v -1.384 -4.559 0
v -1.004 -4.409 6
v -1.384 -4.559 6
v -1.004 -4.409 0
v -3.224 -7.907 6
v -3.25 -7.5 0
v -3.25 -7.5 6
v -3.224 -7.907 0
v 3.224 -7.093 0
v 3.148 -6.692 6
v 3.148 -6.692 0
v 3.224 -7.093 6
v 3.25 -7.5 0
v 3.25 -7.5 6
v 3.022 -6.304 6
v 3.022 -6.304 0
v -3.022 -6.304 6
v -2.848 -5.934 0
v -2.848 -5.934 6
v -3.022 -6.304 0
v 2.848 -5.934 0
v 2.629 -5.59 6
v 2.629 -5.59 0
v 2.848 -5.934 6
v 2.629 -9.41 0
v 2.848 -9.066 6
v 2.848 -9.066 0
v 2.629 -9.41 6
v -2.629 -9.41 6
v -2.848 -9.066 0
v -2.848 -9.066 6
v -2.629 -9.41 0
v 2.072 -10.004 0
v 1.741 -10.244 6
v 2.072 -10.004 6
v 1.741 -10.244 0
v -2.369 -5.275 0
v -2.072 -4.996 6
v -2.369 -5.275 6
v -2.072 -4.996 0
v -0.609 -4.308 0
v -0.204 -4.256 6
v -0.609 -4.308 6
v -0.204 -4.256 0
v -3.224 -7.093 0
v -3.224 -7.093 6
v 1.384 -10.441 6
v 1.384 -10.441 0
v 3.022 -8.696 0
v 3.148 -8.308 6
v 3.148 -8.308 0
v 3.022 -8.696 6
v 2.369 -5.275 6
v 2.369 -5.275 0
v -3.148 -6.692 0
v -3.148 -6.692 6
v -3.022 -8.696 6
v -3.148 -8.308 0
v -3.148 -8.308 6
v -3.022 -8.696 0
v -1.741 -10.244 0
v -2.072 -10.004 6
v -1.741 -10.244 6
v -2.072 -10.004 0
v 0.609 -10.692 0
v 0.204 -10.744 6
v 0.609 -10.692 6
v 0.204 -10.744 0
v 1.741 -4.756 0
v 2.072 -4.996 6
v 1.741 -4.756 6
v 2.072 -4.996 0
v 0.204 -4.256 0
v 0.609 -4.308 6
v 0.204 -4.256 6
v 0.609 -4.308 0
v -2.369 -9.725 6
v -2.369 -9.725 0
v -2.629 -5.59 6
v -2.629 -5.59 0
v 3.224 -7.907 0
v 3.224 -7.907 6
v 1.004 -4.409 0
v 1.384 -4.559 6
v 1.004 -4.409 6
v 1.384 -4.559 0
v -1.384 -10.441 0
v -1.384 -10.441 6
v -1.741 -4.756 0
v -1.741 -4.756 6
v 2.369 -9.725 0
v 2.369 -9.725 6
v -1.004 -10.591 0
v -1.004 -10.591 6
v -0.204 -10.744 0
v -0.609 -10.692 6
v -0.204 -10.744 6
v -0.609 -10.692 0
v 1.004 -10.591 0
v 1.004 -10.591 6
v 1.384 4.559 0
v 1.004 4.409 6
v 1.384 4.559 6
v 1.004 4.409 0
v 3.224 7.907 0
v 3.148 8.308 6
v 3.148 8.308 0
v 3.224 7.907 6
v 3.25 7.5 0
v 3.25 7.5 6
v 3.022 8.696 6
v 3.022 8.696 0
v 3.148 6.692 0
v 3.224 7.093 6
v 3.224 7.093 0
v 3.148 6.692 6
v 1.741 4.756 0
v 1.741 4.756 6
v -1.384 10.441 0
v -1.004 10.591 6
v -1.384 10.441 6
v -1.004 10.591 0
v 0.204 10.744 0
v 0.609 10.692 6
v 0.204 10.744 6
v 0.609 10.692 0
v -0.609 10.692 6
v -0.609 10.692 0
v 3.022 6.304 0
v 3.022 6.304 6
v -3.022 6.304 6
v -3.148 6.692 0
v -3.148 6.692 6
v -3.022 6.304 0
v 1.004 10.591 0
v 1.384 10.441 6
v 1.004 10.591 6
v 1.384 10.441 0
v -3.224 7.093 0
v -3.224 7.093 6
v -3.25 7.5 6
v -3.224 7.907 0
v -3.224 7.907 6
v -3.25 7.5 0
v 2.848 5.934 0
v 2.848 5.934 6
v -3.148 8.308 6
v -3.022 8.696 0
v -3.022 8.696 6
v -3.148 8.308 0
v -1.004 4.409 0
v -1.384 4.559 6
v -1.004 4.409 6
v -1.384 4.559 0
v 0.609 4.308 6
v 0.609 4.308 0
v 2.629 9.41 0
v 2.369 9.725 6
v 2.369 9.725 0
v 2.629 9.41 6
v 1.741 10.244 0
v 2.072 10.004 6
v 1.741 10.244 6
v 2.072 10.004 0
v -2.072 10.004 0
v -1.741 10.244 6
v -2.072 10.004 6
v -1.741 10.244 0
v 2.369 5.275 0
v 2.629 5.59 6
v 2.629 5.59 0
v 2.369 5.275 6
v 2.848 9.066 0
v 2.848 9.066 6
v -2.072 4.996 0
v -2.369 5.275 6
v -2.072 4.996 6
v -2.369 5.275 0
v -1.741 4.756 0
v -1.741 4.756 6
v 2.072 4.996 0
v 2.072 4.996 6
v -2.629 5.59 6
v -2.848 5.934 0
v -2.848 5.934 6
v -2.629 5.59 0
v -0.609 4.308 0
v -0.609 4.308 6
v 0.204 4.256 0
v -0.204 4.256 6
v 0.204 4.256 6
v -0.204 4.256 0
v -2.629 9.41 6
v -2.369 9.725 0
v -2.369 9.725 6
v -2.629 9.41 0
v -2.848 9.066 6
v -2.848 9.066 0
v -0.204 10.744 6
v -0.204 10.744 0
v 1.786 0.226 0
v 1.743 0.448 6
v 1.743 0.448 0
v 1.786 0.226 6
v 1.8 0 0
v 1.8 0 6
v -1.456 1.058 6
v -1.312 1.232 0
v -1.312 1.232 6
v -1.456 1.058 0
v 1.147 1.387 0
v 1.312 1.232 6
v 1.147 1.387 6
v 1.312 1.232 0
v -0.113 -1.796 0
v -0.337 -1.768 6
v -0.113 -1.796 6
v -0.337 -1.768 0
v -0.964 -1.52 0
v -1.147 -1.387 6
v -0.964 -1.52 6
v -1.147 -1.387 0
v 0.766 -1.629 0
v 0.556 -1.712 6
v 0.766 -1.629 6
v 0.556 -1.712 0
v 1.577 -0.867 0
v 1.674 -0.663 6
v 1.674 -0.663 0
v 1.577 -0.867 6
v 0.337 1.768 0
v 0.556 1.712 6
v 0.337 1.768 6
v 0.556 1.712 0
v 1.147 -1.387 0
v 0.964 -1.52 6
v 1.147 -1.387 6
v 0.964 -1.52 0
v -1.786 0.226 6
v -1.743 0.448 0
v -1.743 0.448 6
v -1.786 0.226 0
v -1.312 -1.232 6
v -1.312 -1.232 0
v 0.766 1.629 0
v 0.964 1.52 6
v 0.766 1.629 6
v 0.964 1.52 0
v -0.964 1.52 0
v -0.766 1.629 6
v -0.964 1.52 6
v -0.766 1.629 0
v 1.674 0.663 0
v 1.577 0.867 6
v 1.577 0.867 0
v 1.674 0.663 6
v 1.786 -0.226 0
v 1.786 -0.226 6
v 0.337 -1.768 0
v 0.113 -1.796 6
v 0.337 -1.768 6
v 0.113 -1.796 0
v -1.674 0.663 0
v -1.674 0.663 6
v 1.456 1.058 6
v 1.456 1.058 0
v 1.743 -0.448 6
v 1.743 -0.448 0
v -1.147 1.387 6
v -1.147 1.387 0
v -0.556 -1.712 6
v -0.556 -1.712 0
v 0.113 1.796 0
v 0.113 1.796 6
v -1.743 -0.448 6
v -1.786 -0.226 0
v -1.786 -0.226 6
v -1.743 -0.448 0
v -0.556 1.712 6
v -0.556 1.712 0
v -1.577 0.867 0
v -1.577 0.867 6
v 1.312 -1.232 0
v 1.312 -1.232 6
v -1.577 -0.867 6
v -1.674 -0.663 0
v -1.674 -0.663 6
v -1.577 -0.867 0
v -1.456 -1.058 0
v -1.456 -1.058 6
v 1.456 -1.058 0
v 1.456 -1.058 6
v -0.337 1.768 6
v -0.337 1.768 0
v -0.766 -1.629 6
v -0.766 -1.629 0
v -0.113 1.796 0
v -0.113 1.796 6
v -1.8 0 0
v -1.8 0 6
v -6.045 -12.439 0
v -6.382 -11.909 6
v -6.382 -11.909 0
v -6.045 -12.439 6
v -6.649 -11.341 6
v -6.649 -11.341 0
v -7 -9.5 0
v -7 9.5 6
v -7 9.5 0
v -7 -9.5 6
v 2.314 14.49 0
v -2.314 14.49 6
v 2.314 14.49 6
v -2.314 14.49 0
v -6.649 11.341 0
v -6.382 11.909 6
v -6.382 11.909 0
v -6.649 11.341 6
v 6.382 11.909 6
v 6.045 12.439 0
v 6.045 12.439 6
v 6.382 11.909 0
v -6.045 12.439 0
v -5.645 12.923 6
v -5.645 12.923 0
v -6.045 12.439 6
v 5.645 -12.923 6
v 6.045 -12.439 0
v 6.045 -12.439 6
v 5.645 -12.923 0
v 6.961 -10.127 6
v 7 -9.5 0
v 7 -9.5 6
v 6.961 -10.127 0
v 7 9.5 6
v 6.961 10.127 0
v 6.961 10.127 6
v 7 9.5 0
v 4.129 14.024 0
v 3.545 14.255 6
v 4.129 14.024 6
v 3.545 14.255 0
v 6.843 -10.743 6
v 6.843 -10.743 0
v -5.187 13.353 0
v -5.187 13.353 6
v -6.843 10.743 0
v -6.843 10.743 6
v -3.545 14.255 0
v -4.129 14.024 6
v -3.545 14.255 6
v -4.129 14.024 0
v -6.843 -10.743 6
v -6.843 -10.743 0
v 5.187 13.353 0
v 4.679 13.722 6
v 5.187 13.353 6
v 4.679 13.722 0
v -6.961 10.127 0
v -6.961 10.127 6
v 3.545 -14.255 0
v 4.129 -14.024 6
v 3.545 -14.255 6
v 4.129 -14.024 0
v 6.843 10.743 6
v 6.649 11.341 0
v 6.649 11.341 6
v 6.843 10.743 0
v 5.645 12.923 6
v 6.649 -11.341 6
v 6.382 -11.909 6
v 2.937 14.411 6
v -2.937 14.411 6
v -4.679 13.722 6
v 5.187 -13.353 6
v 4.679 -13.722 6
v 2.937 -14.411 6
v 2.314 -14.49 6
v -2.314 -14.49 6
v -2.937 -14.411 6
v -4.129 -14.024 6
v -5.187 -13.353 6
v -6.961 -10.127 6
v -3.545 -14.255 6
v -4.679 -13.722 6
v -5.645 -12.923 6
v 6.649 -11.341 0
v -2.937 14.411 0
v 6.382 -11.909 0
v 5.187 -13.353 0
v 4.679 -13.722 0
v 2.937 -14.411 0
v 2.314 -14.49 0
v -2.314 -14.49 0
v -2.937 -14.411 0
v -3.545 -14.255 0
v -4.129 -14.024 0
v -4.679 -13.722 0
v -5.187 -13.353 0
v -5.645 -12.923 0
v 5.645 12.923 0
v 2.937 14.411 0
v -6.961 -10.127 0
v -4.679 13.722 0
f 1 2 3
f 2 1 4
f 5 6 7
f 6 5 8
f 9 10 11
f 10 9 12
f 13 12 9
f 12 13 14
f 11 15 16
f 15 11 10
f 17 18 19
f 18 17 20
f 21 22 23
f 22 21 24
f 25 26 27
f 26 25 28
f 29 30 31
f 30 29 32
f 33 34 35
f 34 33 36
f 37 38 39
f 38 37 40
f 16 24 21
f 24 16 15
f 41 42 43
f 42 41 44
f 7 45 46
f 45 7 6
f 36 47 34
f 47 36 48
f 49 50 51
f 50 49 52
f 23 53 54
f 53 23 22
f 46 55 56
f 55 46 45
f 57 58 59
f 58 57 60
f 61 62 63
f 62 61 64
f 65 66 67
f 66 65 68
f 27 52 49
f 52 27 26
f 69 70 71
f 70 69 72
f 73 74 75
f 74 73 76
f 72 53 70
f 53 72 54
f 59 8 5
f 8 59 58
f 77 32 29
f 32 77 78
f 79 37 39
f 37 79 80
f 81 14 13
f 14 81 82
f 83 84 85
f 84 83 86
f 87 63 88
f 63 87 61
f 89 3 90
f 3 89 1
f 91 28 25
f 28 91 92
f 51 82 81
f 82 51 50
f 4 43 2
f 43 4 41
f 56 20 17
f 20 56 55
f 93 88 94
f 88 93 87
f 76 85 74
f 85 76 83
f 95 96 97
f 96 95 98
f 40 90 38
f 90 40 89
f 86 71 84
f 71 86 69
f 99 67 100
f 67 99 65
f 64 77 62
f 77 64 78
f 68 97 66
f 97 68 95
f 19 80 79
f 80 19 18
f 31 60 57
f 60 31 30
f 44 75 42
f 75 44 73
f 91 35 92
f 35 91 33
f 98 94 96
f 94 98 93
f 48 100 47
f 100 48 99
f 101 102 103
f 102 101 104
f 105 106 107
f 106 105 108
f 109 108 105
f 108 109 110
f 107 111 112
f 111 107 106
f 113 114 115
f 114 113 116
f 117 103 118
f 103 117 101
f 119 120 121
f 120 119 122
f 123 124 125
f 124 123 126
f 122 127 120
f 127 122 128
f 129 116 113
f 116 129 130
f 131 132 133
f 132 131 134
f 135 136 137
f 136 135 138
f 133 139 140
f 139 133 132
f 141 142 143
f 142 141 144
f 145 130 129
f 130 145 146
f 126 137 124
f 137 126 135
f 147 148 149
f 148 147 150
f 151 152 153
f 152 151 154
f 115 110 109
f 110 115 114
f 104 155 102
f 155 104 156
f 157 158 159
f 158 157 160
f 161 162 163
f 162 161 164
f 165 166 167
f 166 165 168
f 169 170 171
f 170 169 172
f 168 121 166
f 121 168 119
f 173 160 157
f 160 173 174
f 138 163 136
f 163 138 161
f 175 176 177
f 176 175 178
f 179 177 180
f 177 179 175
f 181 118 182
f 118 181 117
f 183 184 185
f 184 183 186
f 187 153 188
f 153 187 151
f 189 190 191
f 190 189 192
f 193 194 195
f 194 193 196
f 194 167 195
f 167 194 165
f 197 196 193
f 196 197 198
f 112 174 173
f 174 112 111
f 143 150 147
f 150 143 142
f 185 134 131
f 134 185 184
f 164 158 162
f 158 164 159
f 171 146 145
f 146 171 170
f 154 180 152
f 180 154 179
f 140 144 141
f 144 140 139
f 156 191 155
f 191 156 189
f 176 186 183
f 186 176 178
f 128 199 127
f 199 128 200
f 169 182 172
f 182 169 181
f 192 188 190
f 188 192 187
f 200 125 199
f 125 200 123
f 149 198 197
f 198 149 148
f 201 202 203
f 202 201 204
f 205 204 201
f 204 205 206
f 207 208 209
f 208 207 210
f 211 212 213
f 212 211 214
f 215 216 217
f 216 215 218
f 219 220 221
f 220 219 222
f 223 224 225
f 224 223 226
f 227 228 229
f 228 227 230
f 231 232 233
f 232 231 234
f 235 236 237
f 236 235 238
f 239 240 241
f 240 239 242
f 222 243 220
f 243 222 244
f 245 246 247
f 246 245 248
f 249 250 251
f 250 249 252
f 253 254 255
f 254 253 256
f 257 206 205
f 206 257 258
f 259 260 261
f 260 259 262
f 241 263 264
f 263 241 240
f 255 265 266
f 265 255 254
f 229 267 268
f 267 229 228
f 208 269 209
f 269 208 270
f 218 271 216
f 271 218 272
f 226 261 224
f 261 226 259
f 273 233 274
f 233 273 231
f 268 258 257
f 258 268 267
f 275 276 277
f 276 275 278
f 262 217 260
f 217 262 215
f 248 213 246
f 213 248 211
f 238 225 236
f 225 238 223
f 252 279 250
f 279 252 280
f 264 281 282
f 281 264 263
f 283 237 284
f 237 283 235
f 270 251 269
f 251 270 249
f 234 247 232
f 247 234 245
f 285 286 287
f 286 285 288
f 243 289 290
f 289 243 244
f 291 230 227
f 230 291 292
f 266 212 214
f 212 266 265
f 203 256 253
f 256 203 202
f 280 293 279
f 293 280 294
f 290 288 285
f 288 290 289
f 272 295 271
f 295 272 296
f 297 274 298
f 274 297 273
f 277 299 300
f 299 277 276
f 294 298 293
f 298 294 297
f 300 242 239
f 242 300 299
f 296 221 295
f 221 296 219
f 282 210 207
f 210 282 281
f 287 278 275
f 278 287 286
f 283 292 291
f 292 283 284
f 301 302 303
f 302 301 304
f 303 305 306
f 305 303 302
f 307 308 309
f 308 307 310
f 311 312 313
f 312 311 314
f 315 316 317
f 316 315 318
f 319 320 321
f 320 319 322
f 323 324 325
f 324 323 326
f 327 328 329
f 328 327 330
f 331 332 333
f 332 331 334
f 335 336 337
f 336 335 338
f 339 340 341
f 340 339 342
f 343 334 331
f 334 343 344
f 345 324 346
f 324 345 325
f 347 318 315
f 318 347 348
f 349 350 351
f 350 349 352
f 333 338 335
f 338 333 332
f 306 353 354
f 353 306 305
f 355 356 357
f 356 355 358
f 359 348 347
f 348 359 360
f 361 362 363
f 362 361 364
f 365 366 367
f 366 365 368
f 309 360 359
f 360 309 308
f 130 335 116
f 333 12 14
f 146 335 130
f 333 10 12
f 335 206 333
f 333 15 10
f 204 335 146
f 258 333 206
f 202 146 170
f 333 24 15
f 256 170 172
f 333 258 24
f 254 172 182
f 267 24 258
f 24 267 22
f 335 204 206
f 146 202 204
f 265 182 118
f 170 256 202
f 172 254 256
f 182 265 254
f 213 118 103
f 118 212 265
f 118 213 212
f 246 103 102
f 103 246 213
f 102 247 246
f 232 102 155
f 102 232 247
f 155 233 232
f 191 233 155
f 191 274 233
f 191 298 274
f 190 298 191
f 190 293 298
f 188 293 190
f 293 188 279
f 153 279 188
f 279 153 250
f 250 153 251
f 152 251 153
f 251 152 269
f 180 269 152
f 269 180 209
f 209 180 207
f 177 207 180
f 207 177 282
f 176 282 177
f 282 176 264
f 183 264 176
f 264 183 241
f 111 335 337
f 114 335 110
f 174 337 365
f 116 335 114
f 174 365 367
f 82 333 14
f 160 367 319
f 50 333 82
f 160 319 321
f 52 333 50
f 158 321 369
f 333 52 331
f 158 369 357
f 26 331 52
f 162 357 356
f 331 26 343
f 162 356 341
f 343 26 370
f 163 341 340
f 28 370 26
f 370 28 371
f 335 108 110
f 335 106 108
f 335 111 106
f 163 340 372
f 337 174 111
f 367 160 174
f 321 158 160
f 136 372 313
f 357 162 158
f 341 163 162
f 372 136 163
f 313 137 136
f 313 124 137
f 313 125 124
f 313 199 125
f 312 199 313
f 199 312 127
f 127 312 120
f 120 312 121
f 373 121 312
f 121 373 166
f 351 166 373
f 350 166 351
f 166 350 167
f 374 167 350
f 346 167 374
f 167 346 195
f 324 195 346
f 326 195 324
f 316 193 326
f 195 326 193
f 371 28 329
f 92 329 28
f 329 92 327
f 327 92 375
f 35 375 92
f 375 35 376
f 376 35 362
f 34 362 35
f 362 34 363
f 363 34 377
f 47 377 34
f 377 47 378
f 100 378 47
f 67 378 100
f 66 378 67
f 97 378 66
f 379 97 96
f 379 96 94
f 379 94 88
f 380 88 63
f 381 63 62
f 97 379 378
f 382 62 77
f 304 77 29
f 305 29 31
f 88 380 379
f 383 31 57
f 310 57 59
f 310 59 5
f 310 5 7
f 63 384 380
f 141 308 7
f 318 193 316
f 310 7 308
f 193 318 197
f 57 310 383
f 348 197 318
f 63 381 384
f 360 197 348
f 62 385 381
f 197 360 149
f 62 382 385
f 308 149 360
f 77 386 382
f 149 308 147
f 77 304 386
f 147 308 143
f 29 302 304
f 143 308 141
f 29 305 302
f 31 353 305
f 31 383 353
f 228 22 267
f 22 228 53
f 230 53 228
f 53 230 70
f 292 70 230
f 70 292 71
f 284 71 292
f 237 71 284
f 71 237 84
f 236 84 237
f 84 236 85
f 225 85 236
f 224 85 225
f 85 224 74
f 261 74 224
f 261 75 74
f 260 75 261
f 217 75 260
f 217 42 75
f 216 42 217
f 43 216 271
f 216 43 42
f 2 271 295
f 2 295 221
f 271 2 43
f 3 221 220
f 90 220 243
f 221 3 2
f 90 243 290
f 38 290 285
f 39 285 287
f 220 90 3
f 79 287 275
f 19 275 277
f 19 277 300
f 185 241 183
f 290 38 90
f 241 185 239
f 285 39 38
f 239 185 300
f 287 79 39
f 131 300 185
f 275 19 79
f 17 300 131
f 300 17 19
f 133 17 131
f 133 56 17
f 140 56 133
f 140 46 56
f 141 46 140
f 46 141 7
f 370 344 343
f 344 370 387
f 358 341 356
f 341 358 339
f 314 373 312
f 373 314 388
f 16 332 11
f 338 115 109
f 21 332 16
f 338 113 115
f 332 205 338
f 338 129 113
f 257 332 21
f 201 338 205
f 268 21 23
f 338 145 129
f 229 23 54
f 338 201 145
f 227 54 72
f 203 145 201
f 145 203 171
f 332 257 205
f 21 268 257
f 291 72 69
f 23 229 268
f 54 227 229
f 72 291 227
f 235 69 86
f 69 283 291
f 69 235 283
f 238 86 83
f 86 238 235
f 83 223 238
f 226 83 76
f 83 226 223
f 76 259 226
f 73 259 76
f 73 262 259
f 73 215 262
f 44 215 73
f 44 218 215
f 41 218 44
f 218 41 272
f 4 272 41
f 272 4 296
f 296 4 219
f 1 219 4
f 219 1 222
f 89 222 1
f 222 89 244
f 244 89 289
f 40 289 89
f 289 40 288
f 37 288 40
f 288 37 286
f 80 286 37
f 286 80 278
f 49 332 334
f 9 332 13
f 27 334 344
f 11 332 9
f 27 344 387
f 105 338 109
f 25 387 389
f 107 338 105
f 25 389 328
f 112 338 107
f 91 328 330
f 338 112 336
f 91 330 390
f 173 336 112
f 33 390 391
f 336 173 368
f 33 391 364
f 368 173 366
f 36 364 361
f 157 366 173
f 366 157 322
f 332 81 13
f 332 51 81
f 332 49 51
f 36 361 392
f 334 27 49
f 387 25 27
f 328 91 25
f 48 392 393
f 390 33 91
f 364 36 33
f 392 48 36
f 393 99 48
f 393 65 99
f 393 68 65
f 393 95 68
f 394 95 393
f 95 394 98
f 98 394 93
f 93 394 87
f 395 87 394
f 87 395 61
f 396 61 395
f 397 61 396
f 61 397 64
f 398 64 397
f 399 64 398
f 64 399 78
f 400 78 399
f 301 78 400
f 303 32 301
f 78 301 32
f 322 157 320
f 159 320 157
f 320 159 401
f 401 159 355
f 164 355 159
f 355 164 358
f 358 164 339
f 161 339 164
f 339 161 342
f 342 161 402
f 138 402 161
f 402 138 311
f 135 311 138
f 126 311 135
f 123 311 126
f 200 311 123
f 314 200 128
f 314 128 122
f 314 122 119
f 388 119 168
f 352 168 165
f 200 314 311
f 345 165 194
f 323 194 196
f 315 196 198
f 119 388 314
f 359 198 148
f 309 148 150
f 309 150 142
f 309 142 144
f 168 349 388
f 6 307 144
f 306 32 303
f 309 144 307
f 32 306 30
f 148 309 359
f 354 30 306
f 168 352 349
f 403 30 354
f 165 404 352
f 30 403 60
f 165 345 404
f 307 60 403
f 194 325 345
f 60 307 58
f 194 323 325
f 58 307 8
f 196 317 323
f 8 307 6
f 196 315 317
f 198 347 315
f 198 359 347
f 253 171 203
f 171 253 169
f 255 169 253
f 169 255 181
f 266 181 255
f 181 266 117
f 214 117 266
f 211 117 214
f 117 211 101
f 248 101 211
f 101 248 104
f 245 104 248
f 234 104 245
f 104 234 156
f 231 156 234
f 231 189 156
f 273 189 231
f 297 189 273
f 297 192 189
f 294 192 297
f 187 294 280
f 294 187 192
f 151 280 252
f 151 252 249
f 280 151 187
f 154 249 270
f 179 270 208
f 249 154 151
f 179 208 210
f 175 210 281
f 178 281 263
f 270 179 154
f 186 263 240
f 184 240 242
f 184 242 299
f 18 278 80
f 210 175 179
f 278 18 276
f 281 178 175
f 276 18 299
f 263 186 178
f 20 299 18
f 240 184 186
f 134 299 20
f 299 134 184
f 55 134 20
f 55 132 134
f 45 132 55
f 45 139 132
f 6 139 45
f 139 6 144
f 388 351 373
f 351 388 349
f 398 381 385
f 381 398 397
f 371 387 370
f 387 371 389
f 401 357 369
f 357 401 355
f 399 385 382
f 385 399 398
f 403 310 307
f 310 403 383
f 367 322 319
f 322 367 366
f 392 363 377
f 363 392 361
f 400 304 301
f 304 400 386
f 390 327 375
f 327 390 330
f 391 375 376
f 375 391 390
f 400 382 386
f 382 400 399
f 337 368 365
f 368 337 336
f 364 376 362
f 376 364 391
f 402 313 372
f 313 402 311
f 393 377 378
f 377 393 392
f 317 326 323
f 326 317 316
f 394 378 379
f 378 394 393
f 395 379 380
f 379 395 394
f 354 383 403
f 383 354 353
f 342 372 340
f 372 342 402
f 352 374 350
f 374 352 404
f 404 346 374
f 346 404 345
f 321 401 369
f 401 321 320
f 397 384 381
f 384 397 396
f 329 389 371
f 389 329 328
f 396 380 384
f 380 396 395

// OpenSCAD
$fn = 50;

difference() {
	union() {
		hull() {
			translate(v = [-2.0, 9.5, 0]) {
				cylinder(h = 6, r = 5);
			}
			translate(v = [2.0, 9.5, 0]) {
				cylinder(h = 6, r = 5);
			}
			translate(v = [-2.0, -9.5, 0]) {
				cylinder(h = 6, r = 5);
			}
			translate(v = [2.0, -9.5, 0]) {
				cylinder(h = 6, r = 5);
			}
		}
	}
	union() {
		translate(v = [0.0, -7.5, 0]) {
			translate(v = [0, 0, -100]) {
				cylinder(h = 200, r = 3.25);
			}
		}
		translate(v = [0.0, 7.5, 0]) {
			translate(v = [0, 0, -100]) {
				cylinder(h = 200, r = 3.25);
			}
		}
		translate(v = [0.0, -7.5, 0]) {
			translate(v = [0, 0, -100]) {
				cylinder(h = 200, r = 1.8);
			}
		}
		translate(v = [0, 0, -100]) {
			cylinder(h = 200, r = 1.8);
		}
		translate(v = [0.0, 7.5, 0]) {
			translate(v = [0, 0, -100]) {
				cylinder(h = 200, r = 1.8);
			}
		}
	}
}
